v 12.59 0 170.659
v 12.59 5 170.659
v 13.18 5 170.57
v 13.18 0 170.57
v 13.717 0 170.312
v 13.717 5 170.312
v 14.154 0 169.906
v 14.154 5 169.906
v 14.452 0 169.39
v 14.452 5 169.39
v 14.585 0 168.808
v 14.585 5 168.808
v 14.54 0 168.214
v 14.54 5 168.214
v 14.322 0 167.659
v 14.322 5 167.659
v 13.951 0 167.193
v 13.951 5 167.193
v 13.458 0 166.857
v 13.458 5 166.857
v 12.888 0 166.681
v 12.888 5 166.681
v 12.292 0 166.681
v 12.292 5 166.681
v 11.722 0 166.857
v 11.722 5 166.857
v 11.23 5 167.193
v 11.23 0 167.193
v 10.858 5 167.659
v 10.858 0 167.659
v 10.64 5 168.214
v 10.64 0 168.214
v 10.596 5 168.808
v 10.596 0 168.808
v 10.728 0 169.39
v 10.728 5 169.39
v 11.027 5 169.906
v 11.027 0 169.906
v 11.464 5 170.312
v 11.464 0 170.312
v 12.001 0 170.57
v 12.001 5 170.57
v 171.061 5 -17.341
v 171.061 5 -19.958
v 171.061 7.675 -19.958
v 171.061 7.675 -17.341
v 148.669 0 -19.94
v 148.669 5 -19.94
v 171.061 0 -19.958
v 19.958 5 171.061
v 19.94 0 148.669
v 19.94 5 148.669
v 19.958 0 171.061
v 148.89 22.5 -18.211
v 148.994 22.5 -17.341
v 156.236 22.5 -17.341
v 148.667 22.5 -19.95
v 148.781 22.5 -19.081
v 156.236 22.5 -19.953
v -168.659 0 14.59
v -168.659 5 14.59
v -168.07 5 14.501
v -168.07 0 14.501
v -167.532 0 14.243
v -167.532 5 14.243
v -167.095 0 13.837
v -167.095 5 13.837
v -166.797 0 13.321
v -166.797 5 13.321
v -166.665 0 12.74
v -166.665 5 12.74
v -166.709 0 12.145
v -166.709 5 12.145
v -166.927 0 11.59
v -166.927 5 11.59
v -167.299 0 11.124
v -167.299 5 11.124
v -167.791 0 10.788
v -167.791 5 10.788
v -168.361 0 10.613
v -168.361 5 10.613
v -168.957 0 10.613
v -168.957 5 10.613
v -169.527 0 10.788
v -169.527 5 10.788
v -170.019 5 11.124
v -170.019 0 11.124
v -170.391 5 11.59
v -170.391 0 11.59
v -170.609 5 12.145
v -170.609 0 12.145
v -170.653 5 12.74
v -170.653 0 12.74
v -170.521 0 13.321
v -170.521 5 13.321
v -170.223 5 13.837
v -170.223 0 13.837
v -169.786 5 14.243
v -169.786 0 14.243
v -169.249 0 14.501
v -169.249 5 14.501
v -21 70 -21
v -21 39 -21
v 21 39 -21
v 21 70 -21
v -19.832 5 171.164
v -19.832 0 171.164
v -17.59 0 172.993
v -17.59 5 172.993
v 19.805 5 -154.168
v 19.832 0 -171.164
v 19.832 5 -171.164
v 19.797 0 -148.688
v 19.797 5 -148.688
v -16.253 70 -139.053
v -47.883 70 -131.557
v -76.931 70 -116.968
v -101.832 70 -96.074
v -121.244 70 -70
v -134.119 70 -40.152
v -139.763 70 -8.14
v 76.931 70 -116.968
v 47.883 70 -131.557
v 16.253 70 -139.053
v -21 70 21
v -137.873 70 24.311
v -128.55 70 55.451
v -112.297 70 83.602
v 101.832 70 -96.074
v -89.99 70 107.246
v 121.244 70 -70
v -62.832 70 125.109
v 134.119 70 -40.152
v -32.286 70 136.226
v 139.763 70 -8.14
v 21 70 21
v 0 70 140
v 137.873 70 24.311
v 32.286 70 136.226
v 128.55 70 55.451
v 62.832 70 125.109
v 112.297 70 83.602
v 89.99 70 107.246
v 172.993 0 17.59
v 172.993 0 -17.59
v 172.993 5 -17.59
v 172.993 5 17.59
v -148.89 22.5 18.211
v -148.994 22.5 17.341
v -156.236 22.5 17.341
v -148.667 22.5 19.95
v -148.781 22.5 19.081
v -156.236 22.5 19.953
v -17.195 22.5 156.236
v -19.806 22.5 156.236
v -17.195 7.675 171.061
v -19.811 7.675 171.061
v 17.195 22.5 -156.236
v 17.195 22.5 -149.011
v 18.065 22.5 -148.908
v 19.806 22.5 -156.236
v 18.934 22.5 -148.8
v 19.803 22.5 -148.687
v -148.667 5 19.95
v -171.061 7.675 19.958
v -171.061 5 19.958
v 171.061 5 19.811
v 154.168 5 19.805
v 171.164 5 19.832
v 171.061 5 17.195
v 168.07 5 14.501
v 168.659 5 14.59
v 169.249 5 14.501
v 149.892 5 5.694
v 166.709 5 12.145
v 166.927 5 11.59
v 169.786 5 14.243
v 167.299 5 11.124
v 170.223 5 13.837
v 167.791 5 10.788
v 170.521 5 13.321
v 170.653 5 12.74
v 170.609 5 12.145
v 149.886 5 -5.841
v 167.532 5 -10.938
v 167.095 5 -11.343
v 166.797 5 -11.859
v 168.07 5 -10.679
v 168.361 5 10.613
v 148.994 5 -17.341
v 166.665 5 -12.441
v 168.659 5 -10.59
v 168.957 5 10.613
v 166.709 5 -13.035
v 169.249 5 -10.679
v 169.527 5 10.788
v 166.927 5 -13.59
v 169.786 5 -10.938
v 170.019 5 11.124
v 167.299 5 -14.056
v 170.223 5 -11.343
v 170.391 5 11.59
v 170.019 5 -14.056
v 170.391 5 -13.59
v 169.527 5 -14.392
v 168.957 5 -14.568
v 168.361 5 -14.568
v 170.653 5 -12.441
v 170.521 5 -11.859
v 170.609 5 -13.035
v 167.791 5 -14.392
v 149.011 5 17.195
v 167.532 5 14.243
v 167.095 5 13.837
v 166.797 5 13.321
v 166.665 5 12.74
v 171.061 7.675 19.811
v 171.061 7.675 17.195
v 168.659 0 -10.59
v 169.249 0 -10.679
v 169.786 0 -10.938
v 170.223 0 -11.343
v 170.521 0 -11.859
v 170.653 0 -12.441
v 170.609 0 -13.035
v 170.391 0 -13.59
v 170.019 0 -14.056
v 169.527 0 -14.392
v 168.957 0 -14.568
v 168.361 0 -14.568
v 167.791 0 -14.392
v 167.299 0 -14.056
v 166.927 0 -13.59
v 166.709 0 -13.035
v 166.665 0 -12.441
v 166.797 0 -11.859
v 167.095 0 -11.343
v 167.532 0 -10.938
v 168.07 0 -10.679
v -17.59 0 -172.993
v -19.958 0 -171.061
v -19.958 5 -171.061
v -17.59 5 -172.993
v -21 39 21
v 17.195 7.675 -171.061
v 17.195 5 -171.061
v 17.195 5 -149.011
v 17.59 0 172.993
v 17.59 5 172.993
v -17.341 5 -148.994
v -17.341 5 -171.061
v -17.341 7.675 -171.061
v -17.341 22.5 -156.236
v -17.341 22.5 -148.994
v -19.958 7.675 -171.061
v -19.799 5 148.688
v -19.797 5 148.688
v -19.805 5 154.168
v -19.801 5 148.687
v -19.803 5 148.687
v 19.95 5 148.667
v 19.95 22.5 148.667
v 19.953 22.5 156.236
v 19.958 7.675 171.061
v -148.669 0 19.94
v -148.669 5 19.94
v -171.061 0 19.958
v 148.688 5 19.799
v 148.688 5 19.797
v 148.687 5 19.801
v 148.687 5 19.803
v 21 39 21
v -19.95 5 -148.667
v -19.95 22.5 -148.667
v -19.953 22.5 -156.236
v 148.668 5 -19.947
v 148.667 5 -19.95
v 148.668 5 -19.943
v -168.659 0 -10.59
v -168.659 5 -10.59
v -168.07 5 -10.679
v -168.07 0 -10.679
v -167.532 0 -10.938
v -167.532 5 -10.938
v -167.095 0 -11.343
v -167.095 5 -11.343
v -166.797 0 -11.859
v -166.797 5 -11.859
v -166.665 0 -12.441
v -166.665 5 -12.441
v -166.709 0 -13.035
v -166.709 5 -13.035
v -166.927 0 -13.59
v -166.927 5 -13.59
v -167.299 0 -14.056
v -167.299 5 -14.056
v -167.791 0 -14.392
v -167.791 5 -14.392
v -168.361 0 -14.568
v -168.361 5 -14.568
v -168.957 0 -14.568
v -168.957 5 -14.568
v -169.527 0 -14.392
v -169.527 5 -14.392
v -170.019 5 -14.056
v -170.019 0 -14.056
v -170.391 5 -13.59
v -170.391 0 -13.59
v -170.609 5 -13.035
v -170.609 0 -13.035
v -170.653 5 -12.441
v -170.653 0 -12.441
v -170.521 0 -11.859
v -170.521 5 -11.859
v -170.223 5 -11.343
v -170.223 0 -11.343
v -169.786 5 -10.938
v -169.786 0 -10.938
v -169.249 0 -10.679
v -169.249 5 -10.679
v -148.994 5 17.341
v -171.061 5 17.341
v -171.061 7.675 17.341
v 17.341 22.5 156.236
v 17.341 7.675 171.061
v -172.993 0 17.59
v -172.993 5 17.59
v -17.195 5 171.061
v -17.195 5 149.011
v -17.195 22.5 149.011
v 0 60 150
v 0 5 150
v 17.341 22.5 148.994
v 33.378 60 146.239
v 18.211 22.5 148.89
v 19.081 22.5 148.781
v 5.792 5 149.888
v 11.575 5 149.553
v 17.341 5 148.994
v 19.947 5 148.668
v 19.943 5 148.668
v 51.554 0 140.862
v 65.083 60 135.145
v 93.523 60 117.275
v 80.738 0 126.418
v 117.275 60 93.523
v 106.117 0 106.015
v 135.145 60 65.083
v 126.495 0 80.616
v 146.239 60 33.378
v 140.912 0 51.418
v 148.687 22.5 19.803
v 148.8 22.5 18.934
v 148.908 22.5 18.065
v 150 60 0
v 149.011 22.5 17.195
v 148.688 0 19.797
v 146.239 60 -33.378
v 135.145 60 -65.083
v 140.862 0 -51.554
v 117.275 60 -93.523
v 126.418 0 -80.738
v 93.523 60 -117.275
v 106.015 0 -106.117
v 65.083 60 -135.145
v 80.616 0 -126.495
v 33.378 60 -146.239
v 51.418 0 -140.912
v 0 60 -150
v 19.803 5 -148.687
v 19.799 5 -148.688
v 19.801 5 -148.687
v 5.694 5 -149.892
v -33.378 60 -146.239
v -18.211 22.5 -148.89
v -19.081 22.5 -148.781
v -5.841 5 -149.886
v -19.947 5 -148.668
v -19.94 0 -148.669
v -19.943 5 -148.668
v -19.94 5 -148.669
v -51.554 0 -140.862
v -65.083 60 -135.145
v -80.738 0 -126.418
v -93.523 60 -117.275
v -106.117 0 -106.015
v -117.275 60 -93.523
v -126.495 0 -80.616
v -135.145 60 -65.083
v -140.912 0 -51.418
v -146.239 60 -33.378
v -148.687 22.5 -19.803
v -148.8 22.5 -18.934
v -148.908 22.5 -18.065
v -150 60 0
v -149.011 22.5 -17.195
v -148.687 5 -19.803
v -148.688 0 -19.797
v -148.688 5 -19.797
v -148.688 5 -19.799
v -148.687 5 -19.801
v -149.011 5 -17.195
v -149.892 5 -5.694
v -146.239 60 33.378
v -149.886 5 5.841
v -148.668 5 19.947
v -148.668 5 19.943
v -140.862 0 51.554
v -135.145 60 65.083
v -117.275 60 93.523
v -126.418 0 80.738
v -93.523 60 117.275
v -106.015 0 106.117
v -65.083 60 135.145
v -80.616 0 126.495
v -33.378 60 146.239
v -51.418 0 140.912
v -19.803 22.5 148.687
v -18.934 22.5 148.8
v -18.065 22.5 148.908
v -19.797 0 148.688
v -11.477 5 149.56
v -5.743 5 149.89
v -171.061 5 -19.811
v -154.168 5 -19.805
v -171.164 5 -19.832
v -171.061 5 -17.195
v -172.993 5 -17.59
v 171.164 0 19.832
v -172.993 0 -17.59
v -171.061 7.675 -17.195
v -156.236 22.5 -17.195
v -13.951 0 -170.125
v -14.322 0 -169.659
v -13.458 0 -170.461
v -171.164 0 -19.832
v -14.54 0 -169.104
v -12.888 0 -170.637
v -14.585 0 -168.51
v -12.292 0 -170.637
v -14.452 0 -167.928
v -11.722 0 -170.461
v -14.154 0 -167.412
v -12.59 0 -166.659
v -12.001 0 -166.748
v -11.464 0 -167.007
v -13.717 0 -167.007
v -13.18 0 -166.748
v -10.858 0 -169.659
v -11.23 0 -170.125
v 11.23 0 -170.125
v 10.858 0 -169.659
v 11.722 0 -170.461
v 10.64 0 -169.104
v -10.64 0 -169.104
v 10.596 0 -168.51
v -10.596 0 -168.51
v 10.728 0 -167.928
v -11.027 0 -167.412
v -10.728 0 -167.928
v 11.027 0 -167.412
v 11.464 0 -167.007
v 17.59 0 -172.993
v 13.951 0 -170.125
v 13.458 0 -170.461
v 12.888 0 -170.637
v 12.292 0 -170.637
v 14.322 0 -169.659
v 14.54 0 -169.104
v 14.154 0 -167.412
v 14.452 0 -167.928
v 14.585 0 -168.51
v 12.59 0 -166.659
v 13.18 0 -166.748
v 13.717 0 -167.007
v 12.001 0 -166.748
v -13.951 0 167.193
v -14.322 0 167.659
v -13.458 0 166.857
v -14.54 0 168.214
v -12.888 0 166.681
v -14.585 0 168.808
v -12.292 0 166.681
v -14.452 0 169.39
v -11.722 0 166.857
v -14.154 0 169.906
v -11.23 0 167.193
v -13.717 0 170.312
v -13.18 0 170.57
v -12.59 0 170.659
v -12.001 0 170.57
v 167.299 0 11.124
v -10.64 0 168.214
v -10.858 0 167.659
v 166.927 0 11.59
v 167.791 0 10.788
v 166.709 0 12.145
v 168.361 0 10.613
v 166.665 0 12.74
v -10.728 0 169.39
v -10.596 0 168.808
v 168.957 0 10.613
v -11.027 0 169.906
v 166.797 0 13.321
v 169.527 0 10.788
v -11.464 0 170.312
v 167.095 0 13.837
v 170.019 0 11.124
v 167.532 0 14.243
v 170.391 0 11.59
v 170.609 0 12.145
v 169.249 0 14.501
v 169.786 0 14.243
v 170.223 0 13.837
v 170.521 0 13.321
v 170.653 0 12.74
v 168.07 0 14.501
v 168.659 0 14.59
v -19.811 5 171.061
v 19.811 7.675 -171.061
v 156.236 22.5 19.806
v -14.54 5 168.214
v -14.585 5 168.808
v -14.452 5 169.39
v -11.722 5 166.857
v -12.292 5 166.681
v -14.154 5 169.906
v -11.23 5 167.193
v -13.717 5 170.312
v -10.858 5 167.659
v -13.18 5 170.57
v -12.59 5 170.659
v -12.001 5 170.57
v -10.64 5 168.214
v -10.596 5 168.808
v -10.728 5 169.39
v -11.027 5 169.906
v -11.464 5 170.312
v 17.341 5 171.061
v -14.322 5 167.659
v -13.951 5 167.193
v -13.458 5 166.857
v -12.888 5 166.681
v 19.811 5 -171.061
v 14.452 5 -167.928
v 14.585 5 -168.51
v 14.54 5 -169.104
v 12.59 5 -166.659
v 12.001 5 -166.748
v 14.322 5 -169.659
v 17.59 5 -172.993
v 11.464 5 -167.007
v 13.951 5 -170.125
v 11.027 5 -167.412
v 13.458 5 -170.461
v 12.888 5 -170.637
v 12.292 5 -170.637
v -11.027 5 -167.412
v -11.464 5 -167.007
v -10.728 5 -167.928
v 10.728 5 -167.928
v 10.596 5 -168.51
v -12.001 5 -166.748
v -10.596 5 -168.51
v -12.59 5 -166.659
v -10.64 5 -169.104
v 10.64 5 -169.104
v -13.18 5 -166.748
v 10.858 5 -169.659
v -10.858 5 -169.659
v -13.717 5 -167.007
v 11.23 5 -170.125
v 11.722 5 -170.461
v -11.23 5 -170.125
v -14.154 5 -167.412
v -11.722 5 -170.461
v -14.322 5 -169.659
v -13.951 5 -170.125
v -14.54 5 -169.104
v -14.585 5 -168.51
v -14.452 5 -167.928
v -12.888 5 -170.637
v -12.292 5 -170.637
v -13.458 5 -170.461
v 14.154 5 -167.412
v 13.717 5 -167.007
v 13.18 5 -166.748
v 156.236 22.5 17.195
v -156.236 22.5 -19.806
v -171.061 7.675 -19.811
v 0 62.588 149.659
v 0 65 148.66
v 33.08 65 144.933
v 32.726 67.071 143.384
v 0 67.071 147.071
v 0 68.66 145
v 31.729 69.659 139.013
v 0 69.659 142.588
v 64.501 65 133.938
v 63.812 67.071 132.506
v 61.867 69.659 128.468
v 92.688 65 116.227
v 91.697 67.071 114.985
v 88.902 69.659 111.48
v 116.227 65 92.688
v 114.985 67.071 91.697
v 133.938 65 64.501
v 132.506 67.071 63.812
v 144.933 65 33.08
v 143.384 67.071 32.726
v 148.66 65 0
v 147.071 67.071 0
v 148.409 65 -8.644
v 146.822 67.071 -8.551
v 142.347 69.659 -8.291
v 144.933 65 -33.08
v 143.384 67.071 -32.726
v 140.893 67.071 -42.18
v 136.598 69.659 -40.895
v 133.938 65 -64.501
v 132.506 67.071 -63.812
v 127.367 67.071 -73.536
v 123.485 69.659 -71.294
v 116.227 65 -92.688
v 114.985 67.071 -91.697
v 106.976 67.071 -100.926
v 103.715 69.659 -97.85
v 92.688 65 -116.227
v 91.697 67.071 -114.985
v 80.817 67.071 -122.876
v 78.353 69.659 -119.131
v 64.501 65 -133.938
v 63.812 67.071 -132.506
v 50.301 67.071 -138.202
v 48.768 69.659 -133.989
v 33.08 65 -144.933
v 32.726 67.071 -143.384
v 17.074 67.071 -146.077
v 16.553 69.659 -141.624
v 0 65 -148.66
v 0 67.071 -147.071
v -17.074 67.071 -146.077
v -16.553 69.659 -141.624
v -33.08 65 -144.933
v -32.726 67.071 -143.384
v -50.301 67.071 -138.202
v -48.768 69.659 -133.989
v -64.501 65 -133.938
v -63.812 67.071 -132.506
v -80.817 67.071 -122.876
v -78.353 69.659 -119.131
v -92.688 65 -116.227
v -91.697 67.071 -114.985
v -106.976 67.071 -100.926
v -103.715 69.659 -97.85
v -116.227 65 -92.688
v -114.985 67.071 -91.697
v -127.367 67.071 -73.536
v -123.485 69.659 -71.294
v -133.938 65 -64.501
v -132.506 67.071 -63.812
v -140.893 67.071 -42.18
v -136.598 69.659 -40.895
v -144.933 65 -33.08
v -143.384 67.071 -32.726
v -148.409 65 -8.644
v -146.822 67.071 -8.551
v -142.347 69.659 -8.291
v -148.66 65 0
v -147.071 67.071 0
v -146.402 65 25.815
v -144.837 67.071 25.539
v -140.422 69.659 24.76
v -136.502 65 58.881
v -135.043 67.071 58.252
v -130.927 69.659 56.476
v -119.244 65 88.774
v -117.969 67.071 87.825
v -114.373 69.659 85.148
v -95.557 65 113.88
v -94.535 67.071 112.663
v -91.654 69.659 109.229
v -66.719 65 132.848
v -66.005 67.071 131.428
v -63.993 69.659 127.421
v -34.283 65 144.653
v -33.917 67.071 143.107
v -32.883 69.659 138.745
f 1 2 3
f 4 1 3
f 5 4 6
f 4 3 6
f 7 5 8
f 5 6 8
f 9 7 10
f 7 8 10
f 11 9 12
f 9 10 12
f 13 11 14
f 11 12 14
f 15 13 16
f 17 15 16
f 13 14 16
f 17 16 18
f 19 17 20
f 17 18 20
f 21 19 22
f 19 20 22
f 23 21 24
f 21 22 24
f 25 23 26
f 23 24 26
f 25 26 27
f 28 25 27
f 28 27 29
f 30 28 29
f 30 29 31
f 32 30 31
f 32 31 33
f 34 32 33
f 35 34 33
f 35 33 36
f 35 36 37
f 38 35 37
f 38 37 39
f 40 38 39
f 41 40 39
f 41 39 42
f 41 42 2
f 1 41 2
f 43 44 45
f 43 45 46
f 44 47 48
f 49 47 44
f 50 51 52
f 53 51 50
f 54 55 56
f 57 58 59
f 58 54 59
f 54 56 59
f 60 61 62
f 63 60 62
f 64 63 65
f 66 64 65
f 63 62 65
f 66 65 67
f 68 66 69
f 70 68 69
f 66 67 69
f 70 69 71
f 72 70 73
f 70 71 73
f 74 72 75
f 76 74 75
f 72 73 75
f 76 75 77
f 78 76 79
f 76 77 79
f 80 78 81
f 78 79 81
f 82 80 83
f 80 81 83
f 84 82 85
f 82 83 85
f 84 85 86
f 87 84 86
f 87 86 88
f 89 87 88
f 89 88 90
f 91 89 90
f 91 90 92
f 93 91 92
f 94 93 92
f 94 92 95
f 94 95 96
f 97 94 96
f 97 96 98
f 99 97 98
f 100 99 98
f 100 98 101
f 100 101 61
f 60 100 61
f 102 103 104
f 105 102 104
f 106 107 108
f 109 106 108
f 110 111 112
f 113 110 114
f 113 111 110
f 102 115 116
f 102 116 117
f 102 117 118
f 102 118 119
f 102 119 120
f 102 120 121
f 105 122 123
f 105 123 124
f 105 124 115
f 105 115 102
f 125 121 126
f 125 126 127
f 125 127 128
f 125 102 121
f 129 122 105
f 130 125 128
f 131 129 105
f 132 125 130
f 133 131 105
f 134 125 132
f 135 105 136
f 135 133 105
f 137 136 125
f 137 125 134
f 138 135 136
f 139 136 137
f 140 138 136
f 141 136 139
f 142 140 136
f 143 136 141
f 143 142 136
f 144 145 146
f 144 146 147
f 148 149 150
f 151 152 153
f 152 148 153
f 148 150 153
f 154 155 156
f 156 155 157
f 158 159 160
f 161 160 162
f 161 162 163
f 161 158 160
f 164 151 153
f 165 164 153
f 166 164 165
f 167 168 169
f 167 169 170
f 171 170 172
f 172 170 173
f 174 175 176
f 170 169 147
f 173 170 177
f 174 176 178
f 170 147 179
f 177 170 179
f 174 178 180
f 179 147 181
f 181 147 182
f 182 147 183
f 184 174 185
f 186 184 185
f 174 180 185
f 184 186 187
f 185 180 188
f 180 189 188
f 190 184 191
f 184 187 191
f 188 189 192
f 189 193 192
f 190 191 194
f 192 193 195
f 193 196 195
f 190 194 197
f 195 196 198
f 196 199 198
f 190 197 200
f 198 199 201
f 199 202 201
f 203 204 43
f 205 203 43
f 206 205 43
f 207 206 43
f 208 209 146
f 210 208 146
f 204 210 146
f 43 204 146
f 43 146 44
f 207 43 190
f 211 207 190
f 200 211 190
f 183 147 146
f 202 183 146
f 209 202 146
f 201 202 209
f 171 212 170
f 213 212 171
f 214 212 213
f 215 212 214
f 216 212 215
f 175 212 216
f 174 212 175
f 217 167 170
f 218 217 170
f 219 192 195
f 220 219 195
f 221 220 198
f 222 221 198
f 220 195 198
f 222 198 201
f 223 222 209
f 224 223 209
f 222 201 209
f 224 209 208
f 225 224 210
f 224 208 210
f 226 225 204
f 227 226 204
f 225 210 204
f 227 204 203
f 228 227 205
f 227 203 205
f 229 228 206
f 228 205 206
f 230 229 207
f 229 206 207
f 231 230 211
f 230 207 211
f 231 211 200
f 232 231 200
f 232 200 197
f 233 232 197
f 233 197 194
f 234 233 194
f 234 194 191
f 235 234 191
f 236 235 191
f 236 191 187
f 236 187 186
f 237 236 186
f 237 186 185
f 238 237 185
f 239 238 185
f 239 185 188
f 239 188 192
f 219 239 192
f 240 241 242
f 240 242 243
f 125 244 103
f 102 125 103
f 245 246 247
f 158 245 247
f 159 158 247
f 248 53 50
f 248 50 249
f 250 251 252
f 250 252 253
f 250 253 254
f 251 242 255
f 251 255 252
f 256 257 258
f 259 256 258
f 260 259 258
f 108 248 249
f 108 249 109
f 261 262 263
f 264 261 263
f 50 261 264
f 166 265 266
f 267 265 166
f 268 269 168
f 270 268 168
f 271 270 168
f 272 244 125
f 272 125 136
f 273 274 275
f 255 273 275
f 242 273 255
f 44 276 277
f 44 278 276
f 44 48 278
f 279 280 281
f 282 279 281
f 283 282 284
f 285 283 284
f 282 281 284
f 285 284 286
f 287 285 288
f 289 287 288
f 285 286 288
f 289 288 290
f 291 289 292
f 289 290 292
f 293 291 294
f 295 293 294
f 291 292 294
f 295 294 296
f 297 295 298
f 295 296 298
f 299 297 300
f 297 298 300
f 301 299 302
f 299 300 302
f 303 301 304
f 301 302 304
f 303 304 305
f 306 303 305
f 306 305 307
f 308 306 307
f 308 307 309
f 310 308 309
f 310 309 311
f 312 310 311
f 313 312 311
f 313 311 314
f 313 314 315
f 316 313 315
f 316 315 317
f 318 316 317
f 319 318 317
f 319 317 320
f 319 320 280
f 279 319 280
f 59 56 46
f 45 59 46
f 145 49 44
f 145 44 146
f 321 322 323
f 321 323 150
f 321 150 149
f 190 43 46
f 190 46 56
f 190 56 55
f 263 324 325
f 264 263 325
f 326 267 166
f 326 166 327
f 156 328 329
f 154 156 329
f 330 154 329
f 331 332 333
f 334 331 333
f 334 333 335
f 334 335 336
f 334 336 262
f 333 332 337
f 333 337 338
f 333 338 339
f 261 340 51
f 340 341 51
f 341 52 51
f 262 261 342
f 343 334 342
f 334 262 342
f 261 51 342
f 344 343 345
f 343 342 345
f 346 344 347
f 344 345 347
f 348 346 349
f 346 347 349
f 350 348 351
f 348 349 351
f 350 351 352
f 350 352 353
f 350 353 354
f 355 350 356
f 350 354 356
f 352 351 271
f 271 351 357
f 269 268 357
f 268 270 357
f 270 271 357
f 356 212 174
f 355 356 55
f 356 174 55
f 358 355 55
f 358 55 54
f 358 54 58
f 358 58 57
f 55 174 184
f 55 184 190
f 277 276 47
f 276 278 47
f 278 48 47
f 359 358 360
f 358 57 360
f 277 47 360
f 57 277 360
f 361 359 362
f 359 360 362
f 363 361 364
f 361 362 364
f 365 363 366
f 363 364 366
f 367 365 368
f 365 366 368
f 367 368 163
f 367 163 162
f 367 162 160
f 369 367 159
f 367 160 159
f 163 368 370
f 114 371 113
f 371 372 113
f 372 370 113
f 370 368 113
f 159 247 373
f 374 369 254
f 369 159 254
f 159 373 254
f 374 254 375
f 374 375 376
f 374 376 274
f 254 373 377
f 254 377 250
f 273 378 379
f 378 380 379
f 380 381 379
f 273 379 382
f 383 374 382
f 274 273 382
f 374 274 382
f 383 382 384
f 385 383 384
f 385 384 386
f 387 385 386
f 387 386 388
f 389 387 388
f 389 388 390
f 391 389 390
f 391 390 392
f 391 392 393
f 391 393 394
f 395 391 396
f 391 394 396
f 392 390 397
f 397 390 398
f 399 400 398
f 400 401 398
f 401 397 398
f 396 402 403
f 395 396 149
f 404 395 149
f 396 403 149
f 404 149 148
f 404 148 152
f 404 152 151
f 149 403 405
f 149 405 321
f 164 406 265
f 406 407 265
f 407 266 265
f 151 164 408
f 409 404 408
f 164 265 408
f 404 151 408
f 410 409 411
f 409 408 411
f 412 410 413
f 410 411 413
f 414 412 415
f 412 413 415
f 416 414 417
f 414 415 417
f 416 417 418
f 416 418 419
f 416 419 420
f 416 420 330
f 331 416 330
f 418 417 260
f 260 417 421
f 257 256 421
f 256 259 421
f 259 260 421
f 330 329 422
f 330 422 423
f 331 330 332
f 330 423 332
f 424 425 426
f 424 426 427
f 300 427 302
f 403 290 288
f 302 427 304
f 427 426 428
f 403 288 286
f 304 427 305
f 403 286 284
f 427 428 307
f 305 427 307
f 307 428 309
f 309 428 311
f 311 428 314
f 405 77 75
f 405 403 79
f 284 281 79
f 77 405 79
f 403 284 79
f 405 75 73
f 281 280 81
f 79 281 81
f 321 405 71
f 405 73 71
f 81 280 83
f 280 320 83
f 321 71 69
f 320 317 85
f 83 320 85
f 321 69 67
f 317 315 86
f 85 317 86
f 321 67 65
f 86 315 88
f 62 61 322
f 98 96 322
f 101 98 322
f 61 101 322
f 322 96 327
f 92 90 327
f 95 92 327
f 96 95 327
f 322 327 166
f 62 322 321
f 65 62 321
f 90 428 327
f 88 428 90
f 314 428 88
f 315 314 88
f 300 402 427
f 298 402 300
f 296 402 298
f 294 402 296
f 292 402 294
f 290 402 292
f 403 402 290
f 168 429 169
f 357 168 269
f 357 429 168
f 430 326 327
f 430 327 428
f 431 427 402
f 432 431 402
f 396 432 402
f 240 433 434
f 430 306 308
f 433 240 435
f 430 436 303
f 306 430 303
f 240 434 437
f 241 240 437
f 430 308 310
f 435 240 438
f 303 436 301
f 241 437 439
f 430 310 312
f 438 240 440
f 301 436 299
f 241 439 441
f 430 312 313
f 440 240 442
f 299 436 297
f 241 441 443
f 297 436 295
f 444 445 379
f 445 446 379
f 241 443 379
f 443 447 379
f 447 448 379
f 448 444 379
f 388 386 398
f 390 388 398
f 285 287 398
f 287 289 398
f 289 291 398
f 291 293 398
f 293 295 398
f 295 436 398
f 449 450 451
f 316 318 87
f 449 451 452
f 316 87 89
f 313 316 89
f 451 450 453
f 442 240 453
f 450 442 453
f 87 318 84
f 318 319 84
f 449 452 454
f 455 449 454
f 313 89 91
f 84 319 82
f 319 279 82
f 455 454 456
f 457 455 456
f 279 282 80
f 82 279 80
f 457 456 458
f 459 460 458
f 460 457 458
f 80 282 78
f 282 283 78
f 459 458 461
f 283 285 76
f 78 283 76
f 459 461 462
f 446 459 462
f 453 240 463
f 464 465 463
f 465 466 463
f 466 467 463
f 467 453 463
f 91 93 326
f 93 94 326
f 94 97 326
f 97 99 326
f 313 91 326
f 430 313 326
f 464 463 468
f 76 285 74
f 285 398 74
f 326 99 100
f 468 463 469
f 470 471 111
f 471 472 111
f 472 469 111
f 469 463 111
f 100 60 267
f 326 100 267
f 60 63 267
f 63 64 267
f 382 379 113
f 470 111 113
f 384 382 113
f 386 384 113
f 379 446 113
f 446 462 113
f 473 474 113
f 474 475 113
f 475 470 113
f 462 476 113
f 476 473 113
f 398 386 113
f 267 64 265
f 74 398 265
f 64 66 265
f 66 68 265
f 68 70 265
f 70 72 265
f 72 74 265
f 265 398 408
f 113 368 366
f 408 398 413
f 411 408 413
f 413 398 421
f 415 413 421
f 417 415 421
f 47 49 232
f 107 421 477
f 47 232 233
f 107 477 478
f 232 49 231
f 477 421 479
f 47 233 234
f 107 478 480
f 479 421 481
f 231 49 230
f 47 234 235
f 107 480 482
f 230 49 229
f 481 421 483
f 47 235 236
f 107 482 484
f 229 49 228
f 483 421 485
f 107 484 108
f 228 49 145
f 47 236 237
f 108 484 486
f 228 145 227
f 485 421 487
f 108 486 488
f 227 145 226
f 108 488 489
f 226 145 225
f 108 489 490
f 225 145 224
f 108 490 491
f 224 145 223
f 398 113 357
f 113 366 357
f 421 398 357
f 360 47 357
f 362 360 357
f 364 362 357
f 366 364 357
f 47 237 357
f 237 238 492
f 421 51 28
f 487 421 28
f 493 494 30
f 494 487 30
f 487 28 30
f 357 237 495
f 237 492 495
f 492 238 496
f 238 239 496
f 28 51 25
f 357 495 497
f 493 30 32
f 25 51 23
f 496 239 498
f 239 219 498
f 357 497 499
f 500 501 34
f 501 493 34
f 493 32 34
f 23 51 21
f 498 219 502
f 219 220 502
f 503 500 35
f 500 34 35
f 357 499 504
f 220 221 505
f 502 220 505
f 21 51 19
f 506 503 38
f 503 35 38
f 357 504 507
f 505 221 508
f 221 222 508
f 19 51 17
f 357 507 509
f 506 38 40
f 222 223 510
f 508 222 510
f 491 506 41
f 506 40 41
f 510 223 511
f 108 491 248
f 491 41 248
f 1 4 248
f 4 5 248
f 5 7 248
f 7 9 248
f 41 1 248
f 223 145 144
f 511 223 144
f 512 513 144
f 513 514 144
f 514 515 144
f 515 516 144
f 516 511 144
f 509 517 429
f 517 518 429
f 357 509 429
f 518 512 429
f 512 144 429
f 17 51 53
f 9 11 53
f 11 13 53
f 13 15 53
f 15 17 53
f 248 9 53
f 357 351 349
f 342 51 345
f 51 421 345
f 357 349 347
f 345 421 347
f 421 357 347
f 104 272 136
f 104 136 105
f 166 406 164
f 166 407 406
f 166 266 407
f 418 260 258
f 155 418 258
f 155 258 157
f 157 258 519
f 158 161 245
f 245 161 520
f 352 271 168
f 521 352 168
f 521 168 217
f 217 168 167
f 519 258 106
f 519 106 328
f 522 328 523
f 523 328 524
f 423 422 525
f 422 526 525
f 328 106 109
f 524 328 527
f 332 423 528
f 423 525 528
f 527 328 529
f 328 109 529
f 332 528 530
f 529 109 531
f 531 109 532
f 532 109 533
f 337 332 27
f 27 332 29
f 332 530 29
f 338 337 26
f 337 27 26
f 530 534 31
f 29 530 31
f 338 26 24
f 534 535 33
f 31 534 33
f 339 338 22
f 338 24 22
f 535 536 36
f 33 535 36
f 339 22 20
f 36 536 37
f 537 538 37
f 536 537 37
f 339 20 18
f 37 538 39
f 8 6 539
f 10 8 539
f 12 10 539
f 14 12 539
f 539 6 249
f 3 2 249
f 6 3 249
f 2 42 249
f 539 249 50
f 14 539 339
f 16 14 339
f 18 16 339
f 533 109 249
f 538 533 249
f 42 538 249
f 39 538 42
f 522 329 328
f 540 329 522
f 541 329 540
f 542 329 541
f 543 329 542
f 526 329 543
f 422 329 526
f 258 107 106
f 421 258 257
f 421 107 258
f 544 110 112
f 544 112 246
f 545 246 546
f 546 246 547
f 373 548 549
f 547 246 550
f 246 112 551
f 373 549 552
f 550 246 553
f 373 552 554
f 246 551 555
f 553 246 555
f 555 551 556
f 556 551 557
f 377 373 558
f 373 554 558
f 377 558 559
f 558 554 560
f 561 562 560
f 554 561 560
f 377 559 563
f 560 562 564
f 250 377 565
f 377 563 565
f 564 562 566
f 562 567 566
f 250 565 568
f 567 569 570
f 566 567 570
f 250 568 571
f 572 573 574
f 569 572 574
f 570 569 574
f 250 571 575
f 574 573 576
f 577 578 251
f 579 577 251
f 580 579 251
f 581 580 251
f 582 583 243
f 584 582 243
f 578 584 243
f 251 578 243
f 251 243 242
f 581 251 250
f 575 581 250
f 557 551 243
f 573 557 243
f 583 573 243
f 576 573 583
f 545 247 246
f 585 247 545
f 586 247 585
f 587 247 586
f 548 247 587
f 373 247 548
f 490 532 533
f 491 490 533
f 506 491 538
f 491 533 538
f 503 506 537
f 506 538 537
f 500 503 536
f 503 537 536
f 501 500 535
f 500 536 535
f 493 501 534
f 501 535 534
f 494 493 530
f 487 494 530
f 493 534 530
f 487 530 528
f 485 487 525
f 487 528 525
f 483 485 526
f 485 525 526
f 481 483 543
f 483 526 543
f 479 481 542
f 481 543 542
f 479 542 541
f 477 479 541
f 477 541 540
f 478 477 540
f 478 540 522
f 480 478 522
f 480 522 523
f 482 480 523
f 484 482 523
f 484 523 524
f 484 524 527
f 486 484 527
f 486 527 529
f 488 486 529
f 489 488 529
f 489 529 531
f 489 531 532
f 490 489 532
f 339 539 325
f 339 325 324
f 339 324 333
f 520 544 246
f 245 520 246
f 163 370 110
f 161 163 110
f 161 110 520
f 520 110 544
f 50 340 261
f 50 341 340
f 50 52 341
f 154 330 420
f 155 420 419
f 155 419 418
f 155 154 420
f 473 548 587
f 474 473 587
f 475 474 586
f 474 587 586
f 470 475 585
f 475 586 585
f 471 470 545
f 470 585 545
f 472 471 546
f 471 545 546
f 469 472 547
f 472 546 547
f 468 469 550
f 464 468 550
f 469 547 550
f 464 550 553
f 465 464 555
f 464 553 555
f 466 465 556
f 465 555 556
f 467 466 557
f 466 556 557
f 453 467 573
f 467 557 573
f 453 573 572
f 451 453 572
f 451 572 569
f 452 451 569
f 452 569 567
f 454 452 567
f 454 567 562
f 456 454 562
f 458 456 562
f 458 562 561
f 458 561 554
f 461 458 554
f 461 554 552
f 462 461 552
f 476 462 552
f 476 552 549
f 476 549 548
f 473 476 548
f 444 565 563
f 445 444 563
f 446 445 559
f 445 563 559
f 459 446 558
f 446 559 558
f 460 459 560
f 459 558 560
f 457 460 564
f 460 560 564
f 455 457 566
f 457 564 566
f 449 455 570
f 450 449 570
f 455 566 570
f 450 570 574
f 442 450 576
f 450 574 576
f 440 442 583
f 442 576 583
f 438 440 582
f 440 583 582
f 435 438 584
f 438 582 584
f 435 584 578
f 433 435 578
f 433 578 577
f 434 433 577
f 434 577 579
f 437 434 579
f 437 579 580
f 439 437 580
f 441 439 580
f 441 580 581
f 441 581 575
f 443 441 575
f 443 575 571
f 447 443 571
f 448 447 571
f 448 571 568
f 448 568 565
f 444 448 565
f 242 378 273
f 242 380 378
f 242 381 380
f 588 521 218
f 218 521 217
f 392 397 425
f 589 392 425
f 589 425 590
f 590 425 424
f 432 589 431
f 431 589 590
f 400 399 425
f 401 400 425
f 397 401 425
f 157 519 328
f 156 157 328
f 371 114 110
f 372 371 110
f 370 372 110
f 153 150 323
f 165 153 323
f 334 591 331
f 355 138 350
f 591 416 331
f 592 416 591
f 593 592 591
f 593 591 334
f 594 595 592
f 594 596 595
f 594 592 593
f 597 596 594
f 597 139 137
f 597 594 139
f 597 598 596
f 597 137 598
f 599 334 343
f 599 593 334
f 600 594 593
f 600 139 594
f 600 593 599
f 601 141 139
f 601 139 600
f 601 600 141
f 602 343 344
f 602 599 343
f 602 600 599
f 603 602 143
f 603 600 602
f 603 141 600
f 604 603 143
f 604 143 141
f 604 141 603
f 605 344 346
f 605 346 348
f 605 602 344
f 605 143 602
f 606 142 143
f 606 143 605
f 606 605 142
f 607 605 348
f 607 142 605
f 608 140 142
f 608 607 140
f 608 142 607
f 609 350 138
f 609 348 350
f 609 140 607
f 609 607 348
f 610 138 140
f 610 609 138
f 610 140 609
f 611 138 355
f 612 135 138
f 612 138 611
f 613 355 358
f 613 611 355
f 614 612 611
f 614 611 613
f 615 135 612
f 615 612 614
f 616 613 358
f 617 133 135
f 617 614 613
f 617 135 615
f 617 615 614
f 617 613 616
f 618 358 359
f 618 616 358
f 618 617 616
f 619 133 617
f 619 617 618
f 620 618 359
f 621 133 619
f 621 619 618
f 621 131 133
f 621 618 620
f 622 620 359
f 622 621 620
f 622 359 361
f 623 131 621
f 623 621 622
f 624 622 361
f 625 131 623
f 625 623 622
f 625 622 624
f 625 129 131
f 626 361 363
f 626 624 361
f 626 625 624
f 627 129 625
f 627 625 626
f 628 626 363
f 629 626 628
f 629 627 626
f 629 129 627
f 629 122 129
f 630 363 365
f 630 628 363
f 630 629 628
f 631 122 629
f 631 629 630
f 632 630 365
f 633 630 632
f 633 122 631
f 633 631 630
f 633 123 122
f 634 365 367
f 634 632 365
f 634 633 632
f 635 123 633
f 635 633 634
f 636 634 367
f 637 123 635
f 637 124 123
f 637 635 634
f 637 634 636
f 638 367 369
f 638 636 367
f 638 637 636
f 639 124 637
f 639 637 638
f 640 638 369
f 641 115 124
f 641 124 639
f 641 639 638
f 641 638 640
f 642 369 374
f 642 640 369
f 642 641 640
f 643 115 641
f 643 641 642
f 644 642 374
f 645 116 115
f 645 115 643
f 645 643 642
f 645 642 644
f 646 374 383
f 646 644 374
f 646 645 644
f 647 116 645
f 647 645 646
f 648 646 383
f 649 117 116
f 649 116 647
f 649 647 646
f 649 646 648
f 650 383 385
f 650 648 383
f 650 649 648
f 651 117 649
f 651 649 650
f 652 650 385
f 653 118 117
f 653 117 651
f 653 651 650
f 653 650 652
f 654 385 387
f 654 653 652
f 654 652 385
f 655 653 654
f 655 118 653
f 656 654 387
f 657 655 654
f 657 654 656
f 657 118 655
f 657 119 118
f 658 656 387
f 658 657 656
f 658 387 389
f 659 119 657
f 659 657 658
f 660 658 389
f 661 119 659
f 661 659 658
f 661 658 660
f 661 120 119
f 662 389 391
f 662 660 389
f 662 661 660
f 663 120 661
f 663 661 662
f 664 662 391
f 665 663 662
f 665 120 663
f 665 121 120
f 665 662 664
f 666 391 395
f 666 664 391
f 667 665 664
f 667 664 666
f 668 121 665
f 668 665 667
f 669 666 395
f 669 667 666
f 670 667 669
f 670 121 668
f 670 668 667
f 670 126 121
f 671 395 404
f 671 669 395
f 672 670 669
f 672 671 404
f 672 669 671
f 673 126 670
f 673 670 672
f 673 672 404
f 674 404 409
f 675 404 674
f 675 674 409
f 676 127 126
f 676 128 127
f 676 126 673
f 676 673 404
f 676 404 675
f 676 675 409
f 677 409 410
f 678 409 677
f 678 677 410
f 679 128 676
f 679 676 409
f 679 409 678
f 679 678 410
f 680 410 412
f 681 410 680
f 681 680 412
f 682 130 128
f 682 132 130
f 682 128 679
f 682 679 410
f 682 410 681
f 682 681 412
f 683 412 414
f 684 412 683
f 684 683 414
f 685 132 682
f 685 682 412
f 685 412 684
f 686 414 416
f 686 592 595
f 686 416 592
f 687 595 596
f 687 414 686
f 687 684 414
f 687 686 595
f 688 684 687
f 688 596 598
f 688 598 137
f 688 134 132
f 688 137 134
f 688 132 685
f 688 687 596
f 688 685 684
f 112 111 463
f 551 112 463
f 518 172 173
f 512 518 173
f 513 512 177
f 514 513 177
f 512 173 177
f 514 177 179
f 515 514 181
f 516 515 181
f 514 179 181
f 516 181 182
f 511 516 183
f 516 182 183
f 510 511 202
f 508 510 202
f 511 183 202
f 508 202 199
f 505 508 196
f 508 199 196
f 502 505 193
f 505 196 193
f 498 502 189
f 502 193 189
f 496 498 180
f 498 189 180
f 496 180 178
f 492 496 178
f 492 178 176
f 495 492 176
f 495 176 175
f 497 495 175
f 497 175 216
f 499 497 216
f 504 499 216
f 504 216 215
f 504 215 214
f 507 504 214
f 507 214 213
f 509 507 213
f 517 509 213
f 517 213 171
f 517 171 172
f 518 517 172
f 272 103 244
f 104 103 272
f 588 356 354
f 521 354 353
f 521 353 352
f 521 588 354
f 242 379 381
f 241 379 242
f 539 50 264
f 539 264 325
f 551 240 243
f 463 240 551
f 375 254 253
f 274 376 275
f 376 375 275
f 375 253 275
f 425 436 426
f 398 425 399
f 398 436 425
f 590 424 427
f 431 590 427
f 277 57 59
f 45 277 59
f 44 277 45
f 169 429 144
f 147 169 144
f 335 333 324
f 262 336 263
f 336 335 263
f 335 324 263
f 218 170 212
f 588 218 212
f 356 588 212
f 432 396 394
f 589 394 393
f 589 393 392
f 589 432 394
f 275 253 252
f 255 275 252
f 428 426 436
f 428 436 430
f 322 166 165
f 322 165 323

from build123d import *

# Parameters (mm, degrees)
IZIM1_R                      = 150
Y_KSEKLIK_EKSTR_ZYON1_DEPTH  = 70
Y_KSEKLIK_EKSTR_ZYON14_DEPTH = 5
Y_KSEKLIK_EKSTR_ZYON16_DEPTH = 17.5
KES_EKSTR_ZYON1_DEPTH        = 27.5
KES_EKSTR_ZYON3_DEPTH        = 7.5
Y_KSEKLIK_EKSTR_ZYON17_DEPTH = 6
DAIRESEL_KAPLAMA1_COUNT      = 4
DAIRESEL_KAPLAMA2_COUNT      = 4
RADYUS1_R                    = 10
IZIM19_R                     = 2
KES_EKSTR_ZYON5_DEPTH        = 10
IZIM22_R                     = 140
Y_KSEKLIK_EKSTR_ZYON18_DEPTH = 1
KES_EKSTR_ZYON8_DEPTH        = 11
KES_EKSTR_ZYON8_DEPTH_BACK   = 31
IZIM18_W                     = 42
IZIM18_H                     = 42


with BuildPart() as part:
    # Çizim1 → Yükseklik-Ekstrüzyon1 (new body)
    with BuildSketch(Plane(origin=(0, 0, 0), x_dir=(1, 0, 0), z_dir=(0, 1, 0))):
        with Locations(Location((0, 0, 0), (0, 0, 270))):
            Circle(IZIM1_R)
    extrude(amount=Y_KSEKLIK_EKSTR_ZYON1_DEPTH)

    # Çizim2 → Yükseklik-Ekstrüzyon14 (add)
    with BuildSketch(Plane(origin=(0, 0, 0), x_dir=(1, 0, 0), z_dir=(0, 1, 0))):
        with BuildLine():
            Line((-19.938381567, 146.7204745), (-19.959218349, 172.993465408))
            Line((-19.959218349, 172.993465408), (19.834593255, 172.993465408))
            Line((19.834593255, 172.993465408), (19.793688749, 146.733102083))
            add(Edge.make_bspline(
                [(-19.938381567, 146.7204745), (-6.821574105, 149.387431492), (6.677589472, 149.400040821), (19.793688749, 146.733102083)],
                knots=[0, 0, 0, 0, 0.935808431, 0.935808431, 0.935808431, 0.935808431], degree=3))
        make_face()
    y_kseklik_ekstr_zyon14 = extrude(amount=Y_KSEKLIK_EKSTR_ZYON14_DEPTH)

    # Çizim11 → Yükseklik-Ekstrüzyon16 (add)
    with BuildSketch(Plane(origin=(0, 5, 0), x_dir=(1, 0, 0), z_dir=(0, 1, 0))):
        Polygon((-19.957686049, 171.061396107), (-17.341172439, 171.061396107), (-17.341172439, 146.643122555), (-19.949304151, 146.643122555), align=None)
        Polygon((17.194554667, 146.643122555), (19.802686379, 146.643122555), (19.811068277, 171.061396107), (17.194554667, 171.061396107), align=None)
    y_kseklik_ekstr_zyon16 = extrude(amount=Y_KSEKLIK_EKSTR_ZYON16_DEPTH)

    # Çizim12 → Kes-Ekstrüzyon1 (cut, symmetric)
    with BuildSketch(Plane(origin=(0, 0, 0), x_dir=(0, 0, -1), z_dir=(1, 0, 0))):
        Polygon((155.535554898, 23.200577764), (171.374705499, 7.361427163), (171.374705499, 23.200577764), align=None)
    kes_ekstr_zyon1 = extrude(amount=KES_EKSTR_ZYON1_DEPTH, both=True, mode=Mode.SUBTRACT)

    # Çizim13 → Kes-Ekstrüzyon3 (cut)
    with BuildSketch(Plane(origin=(0, 0, 0), x_dir=(1, 0, 0), z_dir=(0, 1, 0))):
        Polygon((-19.957686049, 171.061396107), (-17.341172439, 173.196821818), (-20.112409128, 173.196821818), (-20.112409128, 171.061396107), align=None)
        Polygon((20.112409128, 173.196821818), (20.112409128, 171.061396107), (19.957686049, 171.061396107), (17.341172439, 173.196821818), align=None)
    kes_ekstr_zyon3 = extrude(amount=KES_EKSTR_ZYON3_DEPTH, mode=Mode.SUBTRACT)

    # Çizim17 → Yükseklik-Ekstrüzyon17 (add)
    with BuildSketch(Plane(origin=(0, 0, 0), x_dir=(1, 0, 0), z_dir=(0, 1, 0))):
        Polygon((11.703099503, 121.823652722), (9.703099523, 121.82337545), (8.703339657, 120.091186024), (9.703579771, 118.359273869), (11.703579752, 118.35955114), (12.703339618, 120.091740567), align=None)
        Polygon((-9.703579771, 118.359273869), (-11.703579752, 118.35955114), (-12.703339618, 120.091740567), (-11.703099503, 121.823652722), (-9.703099523, 121.82337545), (-8.703339657, 120.091186024), align=None)
    y_kseklik_ekstr_zyon17 = extrude(amount=Y_KSEKLIK_EKSTR_ZYON17_DEPTH)

    # Dairesel Kaplama1: Yükseklik-Ekstrüzyon14, Yükseklik-Ekstrüzyon16, Kes-Ekstrüzyon3, Yükseklik-Ekstrüzyon17 ×4 about axis
    dairesel_kaplama1_axis = Axis((0, 0, 0), (0, 1, 0))
    add([y_kseklik_ekstr_zyon14.rotate(dairesel_kaplama1_axis, i * 360 / DAIRESEL_KAPLAMA1_COUNT) for i in range(1, DAIRESEL_KAPLAMA1_COUNT)])
    add([y_kseklik_ekstr_zyon16.rotate(dairesel_kaplama1_axis, i * 360 / DAIRESEL_KAPLAMA1_COUNT) for i in range(1, DAIRESEL_KAPLAMA1_COUNT)])
    add([kes_ekstr_zyon3.rotate(dairesel_kaplama1_axis, i * 360 / DAIRESEL_KAPLAMA1_COUNT) for i in range(1, DAIRESEL_KAPLAMA1_COUNT)], mode=Mode.SUBTRACT)
    add([y_kseklik_ekstr_zyon17.rotate(dairesel_kaplama1_axis, i * 360 / DAIRESEL_KAPLAMA1_COUNT) for i in range(1, DAIRESEL_KAPLAMA1_COUNT)])

    # Dairesel Kaplama2: Kes-Ekstrüzyon1 ×4 about axis
    dairesel_kaplama2_axis = Axis((0, 0, 0), (0, 1, 0))
    for i in range(1, DAIRESEL_KAPLAMA2_COUNT):
        add(kes_ekstr_zyon1.rotate(dairesel_kaplama2_axis, i * 360 / DAIRESEL_KAPLAMA2_COUNT), mode=Mode.SUBTRACT)

    # Radyus1
    radyus1_edges = [part.edges().sort_by_distance(p)[0] for p in [
        (0, 70, -150),
    ]]
    fillet(radyus1_edges, radius=RADYUS1_R)

    # Çizim19 → Kes-Ekstrüzyon5 (cut)
    with BuildSketch(Plane(origin=(0, 5, 0), x_dir=(1, 0, 0), z_dir=(0, 1, 0))):
        with Locations(Location((-12.590175798, 168.65903489, 0), (0, 0, 270))):
            Circle(IZIM19_R)
        with Locations(Location((12.590175798, 168.65903489, 0), (0, 0, 270))):
            Circle(IZIM19_R)
        with Locations(Location((168.65903489, 12.590175798, 0), (0, 0, 270))):
            Circle(IZIM19_R)
        with Locations(Location((168.65903489, -12.590175798, 0), (0, 0, 270))):
            Circle(IZIM19_R)
        with Locations(Location((12.590175798, -168.65903489, 0), (0, 0, 270))):
            Circle(IZIM19_R)
        with Locations(Location((-12.590175798, -168.65903489, 0), (0, 0, 270))):
            Circle(IZIM19_R)
        with Locations(Location((-168.65903489, -12.590175798, 0), (0, 0, 270))):
            Circle(IZIM19_R)
        with Locations(Location((-168.65903489, 12.590175798, 0), (0, 0, 270))):
            Circle(IZIM19_R)
    extrude(amount=-KES_EKSTR_ZYON5_DEPTH, mode=Mode.SUBTRACT)

    # Çizim22 → Yükseklik-Ekstrüzyon18 (add)
    with BuildSketch(Plane(origin=(0, 70, 0), x_dir=(1, 0, 0), z_dir=(0, 1, 0))):
        Circle(IZIM22_R)
    extrude(amount=-Y_KSEKLIK_EKSTR_ZYON18_DEPTH)

    # Çizim18 → Kes-Ekstrüzyon8 (cut, two sides: drawn at the far end of the back side and taken through both)
    with BuildSketch(Plane(origin=(0, 70, 0), x_dir=(1, 0, 0), z_dir=(0, 1, 0)).offset(-KES_EKSTR_ZYON8_DEPTH_BACK)):
        Rectangle(IZIM18_W, IZIM18_H)
    extrude(amount=KES_EKSTR_ZYON8_DEPTH + KES_EKSTR_ZYON8_DEPTH_BACK, mode=Mode.SUBTRACT)


solid = part.part
